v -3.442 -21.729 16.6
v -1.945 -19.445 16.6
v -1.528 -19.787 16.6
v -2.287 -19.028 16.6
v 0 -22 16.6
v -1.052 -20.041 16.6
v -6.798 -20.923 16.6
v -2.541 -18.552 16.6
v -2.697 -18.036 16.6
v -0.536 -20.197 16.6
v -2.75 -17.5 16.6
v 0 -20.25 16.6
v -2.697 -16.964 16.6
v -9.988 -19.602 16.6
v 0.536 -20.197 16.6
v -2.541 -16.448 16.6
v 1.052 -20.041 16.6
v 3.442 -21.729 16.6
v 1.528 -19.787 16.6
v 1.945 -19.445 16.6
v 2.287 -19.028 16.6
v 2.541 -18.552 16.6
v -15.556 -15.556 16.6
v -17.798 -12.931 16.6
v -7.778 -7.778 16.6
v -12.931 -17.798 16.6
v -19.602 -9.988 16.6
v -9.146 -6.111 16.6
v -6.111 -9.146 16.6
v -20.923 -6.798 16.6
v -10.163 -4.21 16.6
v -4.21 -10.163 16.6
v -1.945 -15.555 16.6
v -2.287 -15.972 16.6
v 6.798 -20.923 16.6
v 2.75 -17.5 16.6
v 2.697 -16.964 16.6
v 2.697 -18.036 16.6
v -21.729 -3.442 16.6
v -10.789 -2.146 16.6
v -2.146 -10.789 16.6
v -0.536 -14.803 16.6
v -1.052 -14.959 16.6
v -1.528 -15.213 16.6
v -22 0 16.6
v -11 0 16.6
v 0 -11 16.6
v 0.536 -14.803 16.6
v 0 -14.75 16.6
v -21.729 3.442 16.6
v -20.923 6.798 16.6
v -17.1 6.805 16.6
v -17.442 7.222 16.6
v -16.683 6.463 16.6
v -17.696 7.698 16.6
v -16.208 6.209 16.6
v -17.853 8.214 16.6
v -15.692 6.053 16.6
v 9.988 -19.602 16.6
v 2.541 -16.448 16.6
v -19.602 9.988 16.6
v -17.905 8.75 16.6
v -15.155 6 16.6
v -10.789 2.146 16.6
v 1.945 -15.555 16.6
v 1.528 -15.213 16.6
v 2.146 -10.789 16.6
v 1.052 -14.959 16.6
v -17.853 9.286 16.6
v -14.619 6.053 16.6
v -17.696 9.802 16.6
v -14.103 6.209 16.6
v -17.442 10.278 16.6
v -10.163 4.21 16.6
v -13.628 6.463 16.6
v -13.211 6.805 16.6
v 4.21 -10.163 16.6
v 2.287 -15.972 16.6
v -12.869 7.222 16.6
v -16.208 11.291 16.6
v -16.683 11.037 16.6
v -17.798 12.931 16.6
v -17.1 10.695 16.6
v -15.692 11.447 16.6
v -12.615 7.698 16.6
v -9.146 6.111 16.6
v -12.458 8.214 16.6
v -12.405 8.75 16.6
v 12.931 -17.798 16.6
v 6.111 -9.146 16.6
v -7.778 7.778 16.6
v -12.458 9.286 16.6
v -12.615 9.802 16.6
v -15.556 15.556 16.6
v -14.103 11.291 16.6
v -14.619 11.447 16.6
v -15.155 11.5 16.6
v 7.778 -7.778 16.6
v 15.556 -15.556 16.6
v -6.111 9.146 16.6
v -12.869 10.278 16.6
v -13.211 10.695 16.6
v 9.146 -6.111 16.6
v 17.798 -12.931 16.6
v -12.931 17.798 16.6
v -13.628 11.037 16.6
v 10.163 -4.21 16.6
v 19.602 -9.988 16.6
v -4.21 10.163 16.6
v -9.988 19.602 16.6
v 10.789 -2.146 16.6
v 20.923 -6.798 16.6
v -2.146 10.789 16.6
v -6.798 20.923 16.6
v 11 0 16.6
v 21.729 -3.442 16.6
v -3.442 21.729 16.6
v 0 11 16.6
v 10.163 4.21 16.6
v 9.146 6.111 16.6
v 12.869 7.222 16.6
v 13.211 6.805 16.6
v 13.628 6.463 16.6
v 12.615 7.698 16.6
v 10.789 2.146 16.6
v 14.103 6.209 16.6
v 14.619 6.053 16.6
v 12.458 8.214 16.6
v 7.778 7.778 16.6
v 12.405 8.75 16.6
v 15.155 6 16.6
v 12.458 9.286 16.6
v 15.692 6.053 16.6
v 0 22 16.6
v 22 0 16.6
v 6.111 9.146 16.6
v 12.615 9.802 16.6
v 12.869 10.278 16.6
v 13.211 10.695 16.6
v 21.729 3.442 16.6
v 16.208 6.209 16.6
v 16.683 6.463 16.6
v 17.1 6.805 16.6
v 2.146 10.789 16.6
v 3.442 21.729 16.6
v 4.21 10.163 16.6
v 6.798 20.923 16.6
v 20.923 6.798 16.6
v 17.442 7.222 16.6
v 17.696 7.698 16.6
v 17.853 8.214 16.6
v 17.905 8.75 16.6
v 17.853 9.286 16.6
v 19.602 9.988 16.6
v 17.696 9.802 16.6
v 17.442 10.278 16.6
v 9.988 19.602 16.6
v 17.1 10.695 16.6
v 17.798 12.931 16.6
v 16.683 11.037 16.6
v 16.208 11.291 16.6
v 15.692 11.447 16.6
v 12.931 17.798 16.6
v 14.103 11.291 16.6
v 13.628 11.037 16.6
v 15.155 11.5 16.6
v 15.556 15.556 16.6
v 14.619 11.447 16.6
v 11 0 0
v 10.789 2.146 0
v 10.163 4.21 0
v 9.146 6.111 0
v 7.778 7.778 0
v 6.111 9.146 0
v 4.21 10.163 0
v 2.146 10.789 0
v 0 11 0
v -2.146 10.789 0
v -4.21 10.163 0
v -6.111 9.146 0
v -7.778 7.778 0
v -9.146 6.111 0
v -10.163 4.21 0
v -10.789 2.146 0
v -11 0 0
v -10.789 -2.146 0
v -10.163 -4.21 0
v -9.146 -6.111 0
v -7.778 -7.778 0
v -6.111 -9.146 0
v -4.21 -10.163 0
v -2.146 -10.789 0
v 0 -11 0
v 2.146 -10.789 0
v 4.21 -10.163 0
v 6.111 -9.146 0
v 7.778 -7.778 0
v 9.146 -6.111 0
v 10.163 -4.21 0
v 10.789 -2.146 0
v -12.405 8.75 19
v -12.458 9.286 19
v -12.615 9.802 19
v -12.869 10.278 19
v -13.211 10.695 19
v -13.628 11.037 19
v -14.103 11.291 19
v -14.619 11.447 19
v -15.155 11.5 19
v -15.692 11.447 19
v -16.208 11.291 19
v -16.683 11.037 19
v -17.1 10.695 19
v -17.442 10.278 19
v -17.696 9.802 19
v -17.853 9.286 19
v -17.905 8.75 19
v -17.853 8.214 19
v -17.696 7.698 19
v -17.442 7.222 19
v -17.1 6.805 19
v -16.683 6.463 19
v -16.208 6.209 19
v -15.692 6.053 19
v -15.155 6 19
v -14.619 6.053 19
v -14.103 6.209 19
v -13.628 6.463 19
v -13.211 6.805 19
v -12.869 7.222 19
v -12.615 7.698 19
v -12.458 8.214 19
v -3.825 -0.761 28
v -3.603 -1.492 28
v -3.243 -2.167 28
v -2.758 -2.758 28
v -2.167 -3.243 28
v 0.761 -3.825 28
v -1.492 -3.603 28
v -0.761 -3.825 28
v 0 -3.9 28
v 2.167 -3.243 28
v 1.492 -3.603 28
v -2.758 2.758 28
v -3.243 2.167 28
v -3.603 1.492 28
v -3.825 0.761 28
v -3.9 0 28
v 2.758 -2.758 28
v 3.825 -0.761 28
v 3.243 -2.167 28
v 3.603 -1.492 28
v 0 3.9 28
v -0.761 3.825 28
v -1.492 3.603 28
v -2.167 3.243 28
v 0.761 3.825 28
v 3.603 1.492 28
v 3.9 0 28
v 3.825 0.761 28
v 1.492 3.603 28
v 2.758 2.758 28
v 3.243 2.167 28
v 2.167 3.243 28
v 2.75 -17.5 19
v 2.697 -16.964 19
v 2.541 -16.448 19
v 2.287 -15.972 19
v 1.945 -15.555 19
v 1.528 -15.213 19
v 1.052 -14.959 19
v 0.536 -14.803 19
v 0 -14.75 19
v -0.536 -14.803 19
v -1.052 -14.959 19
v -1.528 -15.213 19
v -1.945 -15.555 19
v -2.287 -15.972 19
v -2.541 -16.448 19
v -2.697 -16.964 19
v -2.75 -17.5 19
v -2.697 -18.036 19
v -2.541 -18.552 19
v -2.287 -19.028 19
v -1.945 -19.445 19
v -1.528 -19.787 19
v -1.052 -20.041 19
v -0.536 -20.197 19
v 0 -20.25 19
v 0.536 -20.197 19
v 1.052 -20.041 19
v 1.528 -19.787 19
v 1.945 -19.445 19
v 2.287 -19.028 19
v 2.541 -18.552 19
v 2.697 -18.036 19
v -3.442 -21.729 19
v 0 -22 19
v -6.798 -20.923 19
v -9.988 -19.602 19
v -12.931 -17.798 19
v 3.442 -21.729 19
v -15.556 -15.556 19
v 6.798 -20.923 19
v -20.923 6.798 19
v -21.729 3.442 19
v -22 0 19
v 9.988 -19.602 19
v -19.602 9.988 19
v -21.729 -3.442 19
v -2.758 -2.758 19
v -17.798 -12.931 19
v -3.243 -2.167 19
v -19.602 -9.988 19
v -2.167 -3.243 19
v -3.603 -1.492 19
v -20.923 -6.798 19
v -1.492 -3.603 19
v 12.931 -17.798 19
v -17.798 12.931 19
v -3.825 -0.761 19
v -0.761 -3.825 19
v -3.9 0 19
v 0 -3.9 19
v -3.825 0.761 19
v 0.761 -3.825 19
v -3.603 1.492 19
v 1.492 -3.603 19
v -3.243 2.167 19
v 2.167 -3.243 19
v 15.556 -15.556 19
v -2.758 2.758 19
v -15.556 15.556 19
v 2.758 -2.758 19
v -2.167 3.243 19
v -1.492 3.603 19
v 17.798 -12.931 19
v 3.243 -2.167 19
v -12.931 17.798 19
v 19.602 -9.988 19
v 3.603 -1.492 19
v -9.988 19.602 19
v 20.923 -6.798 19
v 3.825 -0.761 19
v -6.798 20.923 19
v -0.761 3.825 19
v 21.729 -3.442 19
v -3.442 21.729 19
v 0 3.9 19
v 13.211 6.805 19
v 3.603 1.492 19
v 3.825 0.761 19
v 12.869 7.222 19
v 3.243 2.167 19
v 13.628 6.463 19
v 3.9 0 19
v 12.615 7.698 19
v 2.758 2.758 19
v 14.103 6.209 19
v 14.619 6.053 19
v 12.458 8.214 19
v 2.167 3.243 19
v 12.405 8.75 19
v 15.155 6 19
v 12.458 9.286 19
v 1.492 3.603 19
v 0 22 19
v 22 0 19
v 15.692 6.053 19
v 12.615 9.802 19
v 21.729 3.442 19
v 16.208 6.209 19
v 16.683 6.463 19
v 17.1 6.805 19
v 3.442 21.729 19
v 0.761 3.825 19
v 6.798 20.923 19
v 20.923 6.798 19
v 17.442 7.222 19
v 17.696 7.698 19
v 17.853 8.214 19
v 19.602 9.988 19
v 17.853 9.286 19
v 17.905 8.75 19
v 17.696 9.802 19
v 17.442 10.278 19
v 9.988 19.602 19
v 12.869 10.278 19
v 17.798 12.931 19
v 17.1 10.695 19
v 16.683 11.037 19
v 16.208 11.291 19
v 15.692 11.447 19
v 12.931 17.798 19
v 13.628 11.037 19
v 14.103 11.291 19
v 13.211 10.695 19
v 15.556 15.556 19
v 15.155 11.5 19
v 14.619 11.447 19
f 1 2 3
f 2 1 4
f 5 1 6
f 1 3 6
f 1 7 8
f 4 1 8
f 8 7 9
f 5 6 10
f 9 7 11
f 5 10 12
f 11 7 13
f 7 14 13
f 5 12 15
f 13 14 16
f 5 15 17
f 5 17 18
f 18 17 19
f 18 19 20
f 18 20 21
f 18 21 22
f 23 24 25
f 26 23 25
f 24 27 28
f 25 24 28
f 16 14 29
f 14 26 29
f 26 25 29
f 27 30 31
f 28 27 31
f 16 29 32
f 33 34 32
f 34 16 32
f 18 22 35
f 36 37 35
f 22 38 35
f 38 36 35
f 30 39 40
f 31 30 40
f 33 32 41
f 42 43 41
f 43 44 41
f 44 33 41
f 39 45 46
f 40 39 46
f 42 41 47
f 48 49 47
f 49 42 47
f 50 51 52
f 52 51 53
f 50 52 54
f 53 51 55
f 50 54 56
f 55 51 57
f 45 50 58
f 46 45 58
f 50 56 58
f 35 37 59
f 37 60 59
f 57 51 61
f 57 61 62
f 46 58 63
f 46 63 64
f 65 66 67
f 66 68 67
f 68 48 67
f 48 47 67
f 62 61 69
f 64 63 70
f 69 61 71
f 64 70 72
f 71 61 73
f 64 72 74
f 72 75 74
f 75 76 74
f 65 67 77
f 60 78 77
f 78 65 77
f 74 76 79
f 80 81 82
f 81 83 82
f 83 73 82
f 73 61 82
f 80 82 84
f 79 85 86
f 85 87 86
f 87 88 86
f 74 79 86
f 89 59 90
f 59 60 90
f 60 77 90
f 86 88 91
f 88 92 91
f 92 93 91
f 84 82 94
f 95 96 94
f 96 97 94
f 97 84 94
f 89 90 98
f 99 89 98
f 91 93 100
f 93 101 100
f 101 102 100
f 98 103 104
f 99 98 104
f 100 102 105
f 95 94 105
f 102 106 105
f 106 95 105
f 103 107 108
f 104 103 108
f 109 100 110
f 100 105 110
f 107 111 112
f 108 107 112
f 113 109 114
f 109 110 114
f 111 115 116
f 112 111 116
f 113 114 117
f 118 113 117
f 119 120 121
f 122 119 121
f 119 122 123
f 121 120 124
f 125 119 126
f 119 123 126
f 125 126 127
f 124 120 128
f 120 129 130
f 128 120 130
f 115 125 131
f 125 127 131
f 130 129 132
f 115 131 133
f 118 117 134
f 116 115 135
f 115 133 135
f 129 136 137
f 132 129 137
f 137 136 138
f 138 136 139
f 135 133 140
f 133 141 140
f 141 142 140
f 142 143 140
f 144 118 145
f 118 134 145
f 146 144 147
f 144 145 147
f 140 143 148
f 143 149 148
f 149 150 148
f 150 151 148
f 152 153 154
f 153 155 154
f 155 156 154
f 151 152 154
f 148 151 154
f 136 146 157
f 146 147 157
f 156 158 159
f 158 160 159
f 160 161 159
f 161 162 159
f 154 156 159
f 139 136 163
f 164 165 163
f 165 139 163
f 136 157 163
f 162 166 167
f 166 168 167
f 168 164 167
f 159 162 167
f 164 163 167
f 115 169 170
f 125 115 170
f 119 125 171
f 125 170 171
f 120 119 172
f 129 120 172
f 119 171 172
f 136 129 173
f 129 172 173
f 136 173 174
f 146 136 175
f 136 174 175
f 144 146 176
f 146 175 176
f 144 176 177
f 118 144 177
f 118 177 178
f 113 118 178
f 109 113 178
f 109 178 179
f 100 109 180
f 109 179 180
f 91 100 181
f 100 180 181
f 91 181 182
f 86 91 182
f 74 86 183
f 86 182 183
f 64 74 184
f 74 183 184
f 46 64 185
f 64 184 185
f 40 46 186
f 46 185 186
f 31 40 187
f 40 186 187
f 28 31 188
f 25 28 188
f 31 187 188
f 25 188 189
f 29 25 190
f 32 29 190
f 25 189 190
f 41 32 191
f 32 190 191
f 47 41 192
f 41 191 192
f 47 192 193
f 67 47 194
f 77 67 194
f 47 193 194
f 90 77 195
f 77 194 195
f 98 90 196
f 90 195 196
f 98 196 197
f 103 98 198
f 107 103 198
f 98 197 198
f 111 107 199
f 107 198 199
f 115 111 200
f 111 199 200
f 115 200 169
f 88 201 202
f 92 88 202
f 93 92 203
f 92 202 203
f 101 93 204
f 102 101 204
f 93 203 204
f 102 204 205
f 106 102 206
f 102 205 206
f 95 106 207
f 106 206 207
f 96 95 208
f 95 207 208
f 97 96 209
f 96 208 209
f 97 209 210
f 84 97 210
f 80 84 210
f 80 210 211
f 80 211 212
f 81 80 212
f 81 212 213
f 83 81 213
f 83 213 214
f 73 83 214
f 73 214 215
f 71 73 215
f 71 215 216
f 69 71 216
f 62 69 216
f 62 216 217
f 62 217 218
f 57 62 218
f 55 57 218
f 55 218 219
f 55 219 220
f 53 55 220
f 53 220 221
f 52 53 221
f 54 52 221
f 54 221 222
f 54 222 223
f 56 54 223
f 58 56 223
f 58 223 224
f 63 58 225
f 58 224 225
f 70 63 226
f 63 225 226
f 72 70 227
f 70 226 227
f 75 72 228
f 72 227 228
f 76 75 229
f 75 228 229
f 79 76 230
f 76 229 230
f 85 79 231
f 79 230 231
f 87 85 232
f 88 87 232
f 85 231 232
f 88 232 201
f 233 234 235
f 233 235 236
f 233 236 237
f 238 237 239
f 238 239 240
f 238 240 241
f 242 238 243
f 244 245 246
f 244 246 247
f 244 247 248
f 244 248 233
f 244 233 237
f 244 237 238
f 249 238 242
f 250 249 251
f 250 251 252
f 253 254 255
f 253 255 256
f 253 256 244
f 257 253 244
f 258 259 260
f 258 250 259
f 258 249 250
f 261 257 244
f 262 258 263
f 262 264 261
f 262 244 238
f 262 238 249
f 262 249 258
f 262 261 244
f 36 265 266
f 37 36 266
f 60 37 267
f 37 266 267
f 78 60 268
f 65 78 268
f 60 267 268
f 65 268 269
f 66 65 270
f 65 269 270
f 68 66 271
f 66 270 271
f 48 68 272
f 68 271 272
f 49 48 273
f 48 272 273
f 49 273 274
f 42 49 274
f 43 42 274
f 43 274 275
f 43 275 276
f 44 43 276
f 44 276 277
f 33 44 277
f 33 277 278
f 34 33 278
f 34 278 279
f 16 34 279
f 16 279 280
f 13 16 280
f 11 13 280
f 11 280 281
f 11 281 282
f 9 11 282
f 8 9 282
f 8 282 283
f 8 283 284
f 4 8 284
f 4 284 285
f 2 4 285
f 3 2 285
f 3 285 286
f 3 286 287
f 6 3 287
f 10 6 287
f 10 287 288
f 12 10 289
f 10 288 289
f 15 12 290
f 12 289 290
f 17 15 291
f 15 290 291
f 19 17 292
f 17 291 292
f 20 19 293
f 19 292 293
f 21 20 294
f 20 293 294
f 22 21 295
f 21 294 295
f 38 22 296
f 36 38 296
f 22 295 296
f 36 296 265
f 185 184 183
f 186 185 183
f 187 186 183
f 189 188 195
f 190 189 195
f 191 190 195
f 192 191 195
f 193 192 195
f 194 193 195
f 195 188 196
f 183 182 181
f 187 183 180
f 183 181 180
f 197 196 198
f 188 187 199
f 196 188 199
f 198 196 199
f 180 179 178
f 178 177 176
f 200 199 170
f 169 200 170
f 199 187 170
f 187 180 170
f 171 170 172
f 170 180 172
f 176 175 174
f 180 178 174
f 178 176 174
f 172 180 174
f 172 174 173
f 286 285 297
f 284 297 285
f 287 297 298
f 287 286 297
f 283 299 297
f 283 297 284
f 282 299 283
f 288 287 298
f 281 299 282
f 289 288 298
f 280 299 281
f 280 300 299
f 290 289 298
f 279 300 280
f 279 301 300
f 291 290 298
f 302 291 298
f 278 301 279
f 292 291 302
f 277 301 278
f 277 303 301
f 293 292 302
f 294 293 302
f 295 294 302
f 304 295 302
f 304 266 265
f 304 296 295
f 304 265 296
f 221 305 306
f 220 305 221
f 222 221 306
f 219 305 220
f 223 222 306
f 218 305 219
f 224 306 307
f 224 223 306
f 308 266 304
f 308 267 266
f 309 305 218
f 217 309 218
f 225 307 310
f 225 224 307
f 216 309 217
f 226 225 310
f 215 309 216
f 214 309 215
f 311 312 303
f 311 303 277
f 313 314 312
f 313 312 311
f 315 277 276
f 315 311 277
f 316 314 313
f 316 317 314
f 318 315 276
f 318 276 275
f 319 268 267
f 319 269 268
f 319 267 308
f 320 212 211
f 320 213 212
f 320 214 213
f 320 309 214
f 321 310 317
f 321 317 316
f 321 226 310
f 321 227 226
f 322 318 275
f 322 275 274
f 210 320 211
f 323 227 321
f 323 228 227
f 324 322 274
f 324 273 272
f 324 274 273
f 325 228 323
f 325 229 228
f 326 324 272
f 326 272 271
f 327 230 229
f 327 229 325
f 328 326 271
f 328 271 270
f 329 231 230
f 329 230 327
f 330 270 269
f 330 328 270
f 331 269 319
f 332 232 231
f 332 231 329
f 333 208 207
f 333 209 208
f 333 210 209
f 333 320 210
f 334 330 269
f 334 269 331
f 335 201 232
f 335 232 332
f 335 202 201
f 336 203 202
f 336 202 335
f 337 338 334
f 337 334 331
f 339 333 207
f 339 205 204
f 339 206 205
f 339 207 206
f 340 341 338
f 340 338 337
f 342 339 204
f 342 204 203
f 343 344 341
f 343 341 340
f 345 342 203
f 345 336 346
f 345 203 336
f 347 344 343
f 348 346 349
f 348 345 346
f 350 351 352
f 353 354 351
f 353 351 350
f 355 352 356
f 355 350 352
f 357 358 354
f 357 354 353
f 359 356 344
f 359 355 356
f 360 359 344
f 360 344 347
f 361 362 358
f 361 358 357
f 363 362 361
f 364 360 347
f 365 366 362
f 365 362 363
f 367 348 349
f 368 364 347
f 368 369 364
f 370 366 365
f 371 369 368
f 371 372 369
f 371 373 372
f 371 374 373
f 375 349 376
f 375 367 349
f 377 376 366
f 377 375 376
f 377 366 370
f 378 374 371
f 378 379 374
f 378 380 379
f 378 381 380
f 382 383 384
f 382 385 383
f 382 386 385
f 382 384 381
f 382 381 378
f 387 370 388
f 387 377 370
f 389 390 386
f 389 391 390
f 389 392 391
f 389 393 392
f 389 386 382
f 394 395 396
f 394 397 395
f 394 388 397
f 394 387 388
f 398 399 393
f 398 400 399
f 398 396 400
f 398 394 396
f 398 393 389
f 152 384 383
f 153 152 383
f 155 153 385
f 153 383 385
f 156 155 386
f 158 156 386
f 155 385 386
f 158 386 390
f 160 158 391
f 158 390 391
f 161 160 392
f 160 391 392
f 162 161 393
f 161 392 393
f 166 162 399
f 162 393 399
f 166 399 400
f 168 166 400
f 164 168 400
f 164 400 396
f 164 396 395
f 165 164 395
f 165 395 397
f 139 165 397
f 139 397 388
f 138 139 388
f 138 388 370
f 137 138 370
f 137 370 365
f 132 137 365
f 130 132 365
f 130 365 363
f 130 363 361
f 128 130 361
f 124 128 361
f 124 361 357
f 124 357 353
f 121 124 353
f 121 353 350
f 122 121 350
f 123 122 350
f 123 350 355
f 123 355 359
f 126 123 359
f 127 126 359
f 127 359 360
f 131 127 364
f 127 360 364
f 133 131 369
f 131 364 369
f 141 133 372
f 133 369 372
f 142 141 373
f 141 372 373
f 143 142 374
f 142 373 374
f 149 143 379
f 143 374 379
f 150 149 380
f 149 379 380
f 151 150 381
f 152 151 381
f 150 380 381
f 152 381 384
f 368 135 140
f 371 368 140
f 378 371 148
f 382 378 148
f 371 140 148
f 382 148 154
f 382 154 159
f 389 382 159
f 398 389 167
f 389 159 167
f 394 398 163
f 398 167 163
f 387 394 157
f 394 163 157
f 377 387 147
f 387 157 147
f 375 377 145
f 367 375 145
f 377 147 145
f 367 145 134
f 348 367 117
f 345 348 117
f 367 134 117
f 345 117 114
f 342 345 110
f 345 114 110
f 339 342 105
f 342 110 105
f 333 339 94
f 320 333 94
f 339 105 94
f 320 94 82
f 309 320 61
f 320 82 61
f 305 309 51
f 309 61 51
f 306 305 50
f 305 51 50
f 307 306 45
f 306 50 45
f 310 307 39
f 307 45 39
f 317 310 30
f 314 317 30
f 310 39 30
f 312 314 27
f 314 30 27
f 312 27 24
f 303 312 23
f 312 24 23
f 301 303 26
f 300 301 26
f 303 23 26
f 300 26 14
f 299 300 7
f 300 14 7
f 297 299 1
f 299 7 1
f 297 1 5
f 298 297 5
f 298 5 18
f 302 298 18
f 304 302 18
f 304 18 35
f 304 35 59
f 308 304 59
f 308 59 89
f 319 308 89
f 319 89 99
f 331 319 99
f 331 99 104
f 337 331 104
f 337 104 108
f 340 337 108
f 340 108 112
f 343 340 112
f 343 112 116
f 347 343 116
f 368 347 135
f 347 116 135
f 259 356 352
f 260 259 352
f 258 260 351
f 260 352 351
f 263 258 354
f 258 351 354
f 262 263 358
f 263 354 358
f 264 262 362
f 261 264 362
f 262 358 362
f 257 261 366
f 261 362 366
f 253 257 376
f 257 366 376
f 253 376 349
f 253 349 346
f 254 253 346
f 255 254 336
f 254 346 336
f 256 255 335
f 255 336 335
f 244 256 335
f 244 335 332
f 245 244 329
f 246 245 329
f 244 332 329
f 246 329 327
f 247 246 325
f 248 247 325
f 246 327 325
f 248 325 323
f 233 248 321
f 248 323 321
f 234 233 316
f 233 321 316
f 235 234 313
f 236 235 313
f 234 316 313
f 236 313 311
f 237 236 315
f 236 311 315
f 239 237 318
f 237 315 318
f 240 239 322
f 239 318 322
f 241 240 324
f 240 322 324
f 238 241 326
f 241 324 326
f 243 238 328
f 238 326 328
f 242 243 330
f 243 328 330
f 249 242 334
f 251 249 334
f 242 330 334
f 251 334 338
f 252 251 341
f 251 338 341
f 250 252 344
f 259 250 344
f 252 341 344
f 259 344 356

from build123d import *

# Parameters (mm, degrees)
F0_R     = 11
F1_DEPTH = 16.6
F2_R     = 22
F2_R_2   = 11
F3_DEPTH = 2.4
F4_R     = 3.9
F5_DEPTH = 9
F6_R     = 2.75
F7_DEPTH = 25


with BuildPart() as f1:
    # F0 (on Top) → F1 (new body)
    with BuildSketch(Plane.XY):
        Circle(F0_R)
    extrude(amount=F1_DEPTH)

    # F2 (on face) → F3 (join)
    with BuildSketch(Plane.XY.offset(16.6)):
        Circle(F2_R)
        Circle(F2_R_2, mode=Mode.SUBTRACT)
        Circle(F2_R_2)
    extrude(amount=F3_DEPTH)

    # F4 (on face) → F5 (join)
    with BuildSketch(Plane.XY.offset(19)):
        Circle(F4_R)
    extrude(amount=F5_DEPTH)

    # F6 (on face) → F7 (cut)
    with BuildSketch(Plane.XY.offset(19)):
        with Locations((-15.155445, 8.75)):
            Circle(F6_R)
        with Locations((15.155445, 8.75)):
            Circle(F6_R)
        with Locations((0, -17.5)):
            Circle(F6_R)
    extrude(amount=-F7_DEPTH, mode=Mode.SUBTRACT)


solid = f1.part
